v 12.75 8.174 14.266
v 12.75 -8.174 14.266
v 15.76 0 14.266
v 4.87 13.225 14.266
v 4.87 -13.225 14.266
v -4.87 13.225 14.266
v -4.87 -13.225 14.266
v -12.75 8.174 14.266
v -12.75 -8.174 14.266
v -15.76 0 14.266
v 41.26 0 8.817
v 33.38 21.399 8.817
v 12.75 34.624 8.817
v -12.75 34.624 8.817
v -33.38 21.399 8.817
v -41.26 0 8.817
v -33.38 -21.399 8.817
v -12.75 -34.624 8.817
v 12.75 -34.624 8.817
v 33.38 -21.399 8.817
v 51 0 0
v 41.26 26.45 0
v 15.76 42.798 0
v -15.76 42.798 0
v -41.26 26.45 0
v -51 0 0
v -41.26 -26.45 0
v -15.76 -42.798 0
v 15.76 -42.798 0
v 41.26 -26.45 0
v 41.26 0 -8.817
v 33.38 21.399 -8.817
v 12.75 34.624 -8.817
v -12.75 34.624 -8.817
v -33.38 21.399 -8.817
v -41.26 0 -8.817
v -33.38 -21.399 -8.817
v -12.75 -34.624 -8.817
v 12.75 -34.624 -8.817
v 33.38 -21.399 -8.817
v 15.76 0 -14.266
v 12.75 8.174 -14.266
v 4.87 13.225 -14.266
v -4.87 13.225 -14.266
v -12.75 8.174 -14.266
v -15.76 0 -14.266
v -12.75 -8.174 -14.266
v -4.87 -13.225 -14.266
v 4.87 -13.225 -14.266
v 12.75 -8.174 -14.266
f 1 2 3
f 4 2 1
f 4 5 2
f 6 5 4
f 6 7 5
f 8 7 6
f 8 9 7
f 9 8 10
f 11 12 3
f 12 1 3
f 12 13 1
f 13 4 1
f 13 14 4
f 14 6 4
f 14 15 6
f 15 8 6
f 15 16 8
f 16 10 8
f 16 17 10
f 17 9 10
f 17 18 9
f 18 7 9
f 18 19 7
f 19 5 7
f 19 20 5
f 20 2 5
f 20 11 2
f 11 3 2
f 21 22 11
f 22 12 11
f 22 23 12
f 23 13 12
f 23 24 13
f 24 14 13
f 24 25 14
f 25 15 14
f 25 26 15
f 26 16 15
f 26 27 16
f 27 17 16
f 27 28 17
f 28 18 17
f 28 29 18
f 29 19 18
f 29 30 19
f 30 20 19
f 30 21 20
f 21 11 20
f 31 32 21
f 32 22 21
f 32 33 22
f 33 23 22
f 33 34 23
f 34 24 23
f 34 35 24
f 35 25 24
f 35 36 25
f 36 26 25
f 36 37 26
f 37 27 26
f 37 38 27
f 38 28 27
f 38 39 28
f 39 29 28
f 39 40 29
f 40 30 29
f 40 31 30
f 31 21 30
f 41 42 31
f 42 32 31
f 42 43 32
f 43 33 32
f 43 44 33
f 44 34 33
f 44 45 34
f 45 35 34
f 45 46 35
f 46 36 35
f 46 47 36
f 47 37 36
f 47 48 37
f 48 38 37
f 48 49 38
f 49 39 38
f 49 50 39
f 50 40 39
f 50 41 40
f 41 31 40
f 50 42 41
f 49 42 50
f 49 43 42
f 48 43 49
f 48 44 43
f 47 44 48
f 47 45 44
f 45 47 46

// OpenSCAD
// Generated by SolidPython 1.0.1 on 2020-07-29 00:46:53


scale(v = [17, 15, 5]) {
	sphere(r = 3);
}
/***********************************************
*********      SolidPython code:      **********
************************************************
 
# import packages: SolidPython
from solid import *
from solid.utils import *
from itertools import chain, combinations, permutations


class Resize:

    def __init__(self, scad_file):
        self.scad_file = scad_file
        #self.scad_file = import_scad(scad_file)
        # cone/cylinder param:
        self.r1 = 0
        self.r2 = 0
        self.h = 0
        # rectangular prism param:
        self.w = 0
        self.l = 0
        # ellipse param:
        self.r = 0

    # import OpenScad code (file name corresponds to shape)


    # classify shape + parameters
    def assign(self, param1, param2, param3):
        if self.scad_file == 'cone.scad':
            self.r1 = param1
            self.r2 = param2
            self.h = param3
        elif self.scad_file == 'cylinder.scad':
            self.r1 = param1
            self.r2 = param2
            self.h = param3
        elif self.scad_file == 'rectangularPrism.scad':
            self.h = param1
            self.l = param2
            self.w = param3
        else:
            self.r = param1
            self.h = param2

    # resize parameters
    def iterate(self):
        x = range(3, 20, 2)
        i = 1
        if self.scad_file == 'cone.scad':
            tempList = list(permutations(x, 2))
            for temp in tempList:
                param1 = temp[0]
                param2 = temp[1]
                filepath = 'produced_scad_files/' + 'cone' + str(param1) + '_' + str(param2) + '_' + '.scad'
                scad_render_to_file(cylinder(h=param1, r1=param2, r2=0), filepath)

        elif self.scad_file == 'cylinder.scad':
            tempList = list(permutations(x, 3))
            for temp in tempList:
                param1 = temp[0]
                param2 = temp[1]
                filepath = 'produced_scad_files/' + 'cylinder' + str(param1) + '_' + str(param2) + '_' + '.scad'
                scad_render_to_file(cylinder(h=param1, r1=param2, r2=param2), filepath)

        elif self.scad_file == 'rectangularPrism.scad':
            tempList = list(permutations(x, 3))
            for temp in tempList:
                param1 = temp[0]
                param2 = temp[1]
                param3 = temp[2]
                filepath = 'produced_scad_files/' + 'rectangularPrism' + str(param1) + '_' + str(param2) + '_' + str(
                    param3) + '.scad'
                scad_render_to_file(cube(size=(param1, param2, param3)), filepath)

        elif self.scad_file == 'ellipse.scad':
            tempList = list(permutations(x, 4))
            for temp in tempList:
                param1 = temp[0]
                param2 = temp[1]
                param3 = temp[2]
                param4 = temp[3]
                filepath = 'produced_scad_files/' + 'ellipse' + str(param1) + '_' + str(param2) + '_' + str(param3) + '_' + str(param4) + '.scad'
                scad_render_to_file(scale([param1, param2, param3])(sphere(r=param4)), filepath)

    def render_to_scadfile(self):
        scad_render_to_file(scad, 'example.scad') 
 
************************************************/
